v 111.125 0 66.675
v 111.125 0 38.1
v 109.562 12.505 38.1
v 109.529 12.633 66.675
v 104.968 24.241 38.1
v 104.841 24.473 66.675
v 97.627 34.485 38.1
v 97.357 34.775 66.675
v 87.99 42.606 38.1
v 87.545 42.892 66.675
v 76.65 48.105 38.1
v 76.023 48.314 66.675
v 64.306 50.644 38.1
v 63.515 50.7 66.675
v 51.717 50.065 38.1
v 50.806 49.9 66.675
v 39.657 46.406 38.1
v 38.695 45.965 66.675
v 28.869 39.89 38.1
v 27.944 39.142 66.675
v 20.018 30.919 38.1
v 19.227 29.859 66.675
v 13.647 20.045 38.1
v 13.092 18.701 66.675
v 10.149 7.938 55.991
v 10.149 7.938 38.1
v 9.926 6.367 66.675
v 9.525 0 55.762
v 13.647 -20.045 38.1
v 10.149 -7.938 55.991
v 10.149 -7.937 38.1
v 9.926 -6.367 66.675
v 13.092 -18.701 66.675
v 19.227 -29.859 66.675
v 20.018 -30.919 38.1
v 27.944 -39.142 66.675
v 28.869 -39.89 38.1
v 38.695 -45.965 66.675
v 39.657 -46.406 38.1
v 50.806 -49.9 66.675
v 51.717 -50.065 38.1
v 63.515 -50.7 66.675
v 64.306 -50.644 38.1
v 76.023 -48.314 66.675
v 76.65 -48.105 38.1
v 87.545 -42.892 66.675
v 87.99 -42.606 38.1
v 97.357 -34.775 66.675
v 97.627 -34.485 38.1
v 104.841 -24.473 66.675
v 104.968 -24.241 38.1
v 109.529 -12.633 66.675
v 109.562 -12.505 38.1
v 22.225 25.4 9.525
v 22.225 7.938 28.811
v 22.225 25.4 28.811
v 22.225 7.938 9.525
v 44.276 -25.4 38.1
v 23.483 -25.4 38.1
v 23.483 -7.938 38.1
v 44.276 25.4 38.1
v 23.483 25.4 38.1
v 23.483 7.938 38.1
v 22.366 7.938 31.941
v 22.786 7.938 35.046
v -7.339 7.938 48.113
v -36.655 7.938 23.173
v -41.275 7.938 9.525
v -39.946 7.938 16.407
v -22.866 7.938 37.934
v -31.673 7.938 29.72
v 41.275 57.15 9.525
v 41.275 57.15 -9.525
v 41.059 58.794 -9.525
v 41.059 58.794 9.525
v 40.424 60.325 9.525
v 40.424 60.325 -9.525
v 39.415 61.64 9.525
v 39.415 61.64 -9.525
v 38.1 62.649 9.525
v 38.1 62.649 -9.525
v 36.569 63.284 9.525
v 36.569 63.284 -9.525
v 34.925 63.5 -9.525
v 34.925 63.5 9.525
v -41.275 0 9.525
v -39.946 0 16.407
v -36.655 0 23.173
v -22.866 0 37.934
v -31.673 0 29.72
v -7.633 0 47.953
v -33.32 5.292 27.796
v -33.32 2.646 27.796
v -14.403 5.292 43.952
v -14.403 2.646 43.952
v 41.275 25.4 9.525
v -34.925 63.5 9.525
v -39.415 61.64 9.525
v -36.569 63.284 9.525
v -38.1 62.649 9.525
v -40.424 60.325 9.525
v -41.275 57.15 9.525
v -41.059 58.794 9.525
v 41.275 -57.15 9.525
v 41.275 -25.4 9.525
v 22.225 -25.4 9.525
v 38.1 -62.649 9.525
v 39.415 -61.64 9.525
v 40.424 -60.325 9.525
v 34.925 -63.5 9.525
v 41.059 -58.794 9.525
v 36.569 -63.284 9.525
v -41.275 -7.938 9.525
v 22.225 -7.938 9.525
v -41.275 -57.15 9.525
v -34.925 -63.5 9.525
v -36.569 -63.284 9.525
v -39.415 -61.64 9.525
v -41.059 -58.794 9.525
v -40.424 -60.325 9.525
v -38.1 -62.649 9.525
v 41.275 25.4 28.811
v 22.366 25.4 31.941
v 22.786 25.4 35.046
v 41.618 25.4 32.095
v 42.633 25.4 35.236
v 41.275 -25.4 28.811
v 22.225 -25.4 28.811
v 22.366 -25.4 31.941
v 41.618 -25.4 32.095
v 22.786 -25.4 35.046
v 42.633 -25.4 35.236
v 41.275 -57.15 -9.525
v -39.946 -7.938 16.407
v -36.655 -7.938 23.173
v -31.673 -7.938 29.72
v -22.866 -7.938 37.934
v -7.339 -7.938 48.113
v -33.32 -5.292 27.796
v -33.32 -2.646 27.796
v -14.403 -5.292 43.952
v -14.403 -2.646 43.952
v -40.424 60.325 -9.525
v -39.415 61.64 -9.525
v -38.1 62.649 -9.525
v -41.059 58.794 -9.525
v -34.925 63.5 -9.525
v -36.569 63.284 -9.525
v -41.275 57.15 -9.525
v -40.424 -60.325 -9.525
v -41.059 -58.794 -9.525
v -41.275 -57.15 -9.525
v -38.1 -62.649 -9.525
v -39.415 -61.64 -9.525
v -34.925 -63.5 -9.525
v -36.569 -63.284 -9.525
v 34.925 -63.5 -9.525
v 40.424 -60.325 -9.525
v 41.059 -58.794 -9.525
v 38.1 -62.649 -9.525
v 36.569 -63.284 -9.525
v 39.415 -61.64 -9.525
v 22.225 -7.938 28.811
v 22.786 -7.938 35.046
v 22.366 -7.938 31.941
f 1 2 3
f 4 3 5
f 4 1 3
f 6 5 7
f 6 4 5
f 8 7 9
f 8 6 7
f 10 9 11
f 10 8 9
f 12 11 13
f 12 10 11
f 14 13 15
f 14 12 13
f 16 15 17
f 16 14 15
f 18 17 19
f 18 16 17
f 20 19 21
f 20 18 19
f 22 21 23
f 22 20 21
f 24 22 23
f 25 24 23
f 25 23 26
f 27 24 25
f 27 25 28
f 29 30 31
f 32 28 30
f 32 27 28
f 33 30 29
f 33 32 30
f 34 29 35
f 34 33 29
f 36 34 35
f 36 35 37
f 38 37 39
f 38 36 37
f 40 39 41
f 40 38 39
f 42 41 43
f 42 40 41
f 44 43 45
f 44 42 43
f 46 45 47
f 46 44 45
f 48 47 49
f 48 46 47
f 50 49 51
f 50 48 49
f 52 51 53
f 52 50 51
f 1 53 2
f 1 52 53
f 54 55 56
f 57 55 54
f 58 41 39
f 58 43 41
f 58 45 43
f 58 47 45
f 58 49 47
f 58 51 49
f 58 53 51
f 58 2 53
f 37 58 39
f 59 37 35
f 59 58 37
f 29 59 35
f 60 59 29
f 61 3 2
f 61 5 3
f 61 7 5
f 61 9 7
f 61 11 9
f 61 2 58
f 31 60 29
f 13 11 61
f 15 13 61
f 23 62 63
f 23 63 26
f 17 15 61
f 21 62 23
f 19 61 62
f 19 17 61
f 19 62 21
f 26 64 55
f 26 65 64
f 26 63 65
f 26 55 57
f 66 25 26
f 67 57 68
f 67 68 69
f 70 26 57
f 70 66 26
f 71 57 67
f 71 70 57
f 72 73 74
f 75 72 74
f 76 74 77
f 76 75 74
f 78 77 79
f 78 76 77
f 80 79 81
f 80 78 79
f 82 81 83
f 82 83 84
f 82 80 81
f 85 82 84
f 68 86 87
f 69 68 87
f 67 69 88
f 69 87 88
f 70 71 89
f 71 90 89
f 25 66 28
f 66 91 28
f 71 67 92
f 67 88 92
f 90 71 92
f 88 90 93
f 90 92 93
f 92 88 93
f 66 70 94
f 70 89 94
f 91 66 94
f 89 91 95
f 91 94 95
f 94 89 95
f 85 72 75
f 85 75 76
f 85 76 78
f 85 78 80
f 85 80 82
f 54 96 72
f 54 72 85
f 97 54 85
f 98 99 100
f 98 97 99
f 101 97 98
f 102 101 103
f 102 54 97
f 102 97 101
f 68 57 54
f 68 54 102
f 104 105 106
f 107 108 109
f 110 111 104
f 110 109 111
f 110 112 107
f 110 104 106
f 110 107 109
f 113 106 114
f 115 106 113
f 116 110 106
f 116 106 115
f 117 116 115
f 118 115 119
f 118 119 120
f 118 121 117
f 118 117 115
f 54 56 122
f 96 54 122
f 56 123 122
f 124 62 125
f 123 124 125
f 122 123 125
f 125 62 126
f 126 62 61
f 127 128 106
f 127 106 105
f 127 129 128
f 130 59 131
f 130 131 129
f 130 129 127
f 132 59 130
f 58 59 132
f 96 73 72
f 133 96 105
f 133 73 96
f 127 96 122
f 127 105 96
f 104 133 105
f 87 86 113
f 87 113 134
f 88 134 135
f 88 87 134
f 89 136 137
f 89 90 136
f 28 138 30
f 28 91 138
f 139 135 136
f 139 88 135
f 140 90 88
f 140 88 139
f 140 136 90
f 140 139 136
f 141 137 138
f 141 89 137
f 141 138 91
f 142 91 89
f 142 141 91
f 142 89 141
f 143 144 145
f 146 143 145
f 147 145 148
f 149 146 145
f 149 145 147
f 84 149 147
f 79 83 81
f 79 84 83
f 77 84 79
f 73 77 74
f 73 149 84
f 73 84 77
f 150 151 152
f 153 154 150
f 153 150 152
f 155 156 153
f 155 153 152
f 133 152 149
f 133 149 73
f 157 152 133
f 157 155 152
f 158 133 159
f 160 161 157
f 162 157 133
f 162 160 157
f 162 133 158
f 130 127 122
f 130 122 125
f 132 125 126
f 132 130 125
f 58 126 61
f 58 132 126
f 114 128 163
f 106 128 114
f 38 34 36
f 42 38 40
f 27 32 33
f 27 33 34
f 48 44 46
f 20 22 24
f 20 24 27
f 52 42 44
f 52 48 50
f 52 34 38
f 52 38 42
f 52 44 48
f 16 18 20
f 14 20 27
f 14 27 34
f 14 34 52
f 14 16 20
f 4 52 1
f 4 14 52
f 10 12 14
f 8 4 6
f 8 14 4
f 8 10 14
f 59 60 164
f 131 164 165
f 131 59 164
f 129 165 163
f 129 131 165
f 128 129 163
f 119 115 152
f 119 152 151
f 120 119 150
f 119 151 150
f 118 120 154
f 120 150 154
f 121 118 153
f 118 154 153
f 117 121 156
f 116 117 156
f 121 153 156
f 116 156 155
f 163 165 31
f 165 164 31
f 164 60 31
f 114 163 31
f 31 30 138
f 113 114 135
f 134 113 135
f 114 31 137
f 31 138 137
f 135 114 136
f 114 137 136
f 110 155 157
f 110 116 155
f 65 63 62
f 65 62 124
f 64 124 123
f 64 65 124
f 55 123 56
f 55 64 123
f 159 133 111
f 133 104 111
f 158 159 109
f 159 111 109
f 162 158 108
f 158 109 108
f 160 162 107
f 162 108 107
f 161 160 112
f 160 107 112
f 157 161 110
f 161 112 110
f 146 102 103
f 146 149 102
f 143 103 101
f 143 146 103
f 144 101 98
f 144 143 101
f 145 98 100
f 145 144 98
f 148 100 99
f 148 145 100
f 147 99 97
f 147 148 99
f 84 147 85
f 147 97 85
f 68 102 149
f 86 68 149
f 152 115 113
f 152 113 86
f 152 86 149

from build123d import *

# Parameters (mm, degrees)
F1_DEPTH = 63.5
F0_W     = 10.8645128564
F0_H     = 19.05
F2_DEPTH = 25.4
F3_DEPTH = 7.9375
F5_R     = 6.35


with BuildPart() as f1:
    # F0 (on Front) → F1 (new body, symmetric)
    with BuildSketch(Plane.XZ):
        Polygon((-41.275, -9.525), (41.275, -9.525), (41.275, 9.525), (22.225, 9.525), (-41.275, 9.525), align=None)
    extrude(amount=F1_DEPTH, both=True)

    # F0 (on Front) → F2 (join, symmetric)
    with BuildSketch(Plane.XZ):
        with BuildLine():
            Line((22.225, 9.525), (41.275, 9.525))
            Line((41.275, 9.525), (41.275, 28.8110316193))
            ThreePointArc((41.275, 28.8110316193), (43.5686828026, 37.0307304084), (49.7869304797, 42.8752))
            Line((49.7869304797, 42.8752), (60.325, 42.8752))
            Line((60.325, 42.8752), (60.325, 61.9252))
            Line((60.325, 61.9252), (46.0501136286, 61.9252))
            ThreePointArc((46.0501136286, 61.9252), (28.8002278976, 49.2082384561), (22.225, 28.8110316193))
            Line((22.225, 28.8110316193), (22.225, 9.525))
        make_face()
        with Locations((65.7572564282, 52.4002)):
            Rectangle(F0_W, F0_H)
    extrude(amount=F2_DEPTH, both=True)

    # F0 (on Front) → F3 (join, symmetric)
    with BuildSketch(Plane.XZ):
        with BuildLine():
            add(Edge.make_bspline(
                [(-41.275, 9.525), (-40.2269773185, 37.5649705529), (16.0009935498, 65.2335137129), (46.0501136286, 61.9252)],
                knots=[0, 0, 0, 0, 101.8403477522, 101.8403477522, 101.8403477522, 101.8403477522], degree=3))
            Line((-41.275, 9.525), (22.225, 9.525))
            Line((22.225, 9.525), (22.225, 28.8110316193))
            ThreePointArc((22.225, 28.8110316193), (28.8002278976, 49.2082384561), (46.0501136286, 61.9252))
        make_face()
    extrude(amount=F3_DEPTH, both=True)

    # F0 (on Front) → F4 (revolve)
    with BuildSketch(Plane.XZ):
        Polygon((60.325, 66.675), (60.325, 61.9252), (71.1895128564, 61.9252), (71.1895128564, 42.8752), (60.325, 42.8752), (60.325, 38.1), (111.125, 38.1), (111.125, 66.675), align=None)
    revolve(axis=Axis((60.325, 0, 52.3875), (0, 0, 1)))

    # F5
    f5_edges = [f1.edges().sort_by_distance(p)[0] for p in [
        (-41.275, -63.5, 0),
        (41.275, -63.5, 0),
        (41.275, 63.5, 0),
        (-41.275, 63.5, 0),
    ]]
    fillet(f5_edges, radius=F5_R)


solid = f1.part
